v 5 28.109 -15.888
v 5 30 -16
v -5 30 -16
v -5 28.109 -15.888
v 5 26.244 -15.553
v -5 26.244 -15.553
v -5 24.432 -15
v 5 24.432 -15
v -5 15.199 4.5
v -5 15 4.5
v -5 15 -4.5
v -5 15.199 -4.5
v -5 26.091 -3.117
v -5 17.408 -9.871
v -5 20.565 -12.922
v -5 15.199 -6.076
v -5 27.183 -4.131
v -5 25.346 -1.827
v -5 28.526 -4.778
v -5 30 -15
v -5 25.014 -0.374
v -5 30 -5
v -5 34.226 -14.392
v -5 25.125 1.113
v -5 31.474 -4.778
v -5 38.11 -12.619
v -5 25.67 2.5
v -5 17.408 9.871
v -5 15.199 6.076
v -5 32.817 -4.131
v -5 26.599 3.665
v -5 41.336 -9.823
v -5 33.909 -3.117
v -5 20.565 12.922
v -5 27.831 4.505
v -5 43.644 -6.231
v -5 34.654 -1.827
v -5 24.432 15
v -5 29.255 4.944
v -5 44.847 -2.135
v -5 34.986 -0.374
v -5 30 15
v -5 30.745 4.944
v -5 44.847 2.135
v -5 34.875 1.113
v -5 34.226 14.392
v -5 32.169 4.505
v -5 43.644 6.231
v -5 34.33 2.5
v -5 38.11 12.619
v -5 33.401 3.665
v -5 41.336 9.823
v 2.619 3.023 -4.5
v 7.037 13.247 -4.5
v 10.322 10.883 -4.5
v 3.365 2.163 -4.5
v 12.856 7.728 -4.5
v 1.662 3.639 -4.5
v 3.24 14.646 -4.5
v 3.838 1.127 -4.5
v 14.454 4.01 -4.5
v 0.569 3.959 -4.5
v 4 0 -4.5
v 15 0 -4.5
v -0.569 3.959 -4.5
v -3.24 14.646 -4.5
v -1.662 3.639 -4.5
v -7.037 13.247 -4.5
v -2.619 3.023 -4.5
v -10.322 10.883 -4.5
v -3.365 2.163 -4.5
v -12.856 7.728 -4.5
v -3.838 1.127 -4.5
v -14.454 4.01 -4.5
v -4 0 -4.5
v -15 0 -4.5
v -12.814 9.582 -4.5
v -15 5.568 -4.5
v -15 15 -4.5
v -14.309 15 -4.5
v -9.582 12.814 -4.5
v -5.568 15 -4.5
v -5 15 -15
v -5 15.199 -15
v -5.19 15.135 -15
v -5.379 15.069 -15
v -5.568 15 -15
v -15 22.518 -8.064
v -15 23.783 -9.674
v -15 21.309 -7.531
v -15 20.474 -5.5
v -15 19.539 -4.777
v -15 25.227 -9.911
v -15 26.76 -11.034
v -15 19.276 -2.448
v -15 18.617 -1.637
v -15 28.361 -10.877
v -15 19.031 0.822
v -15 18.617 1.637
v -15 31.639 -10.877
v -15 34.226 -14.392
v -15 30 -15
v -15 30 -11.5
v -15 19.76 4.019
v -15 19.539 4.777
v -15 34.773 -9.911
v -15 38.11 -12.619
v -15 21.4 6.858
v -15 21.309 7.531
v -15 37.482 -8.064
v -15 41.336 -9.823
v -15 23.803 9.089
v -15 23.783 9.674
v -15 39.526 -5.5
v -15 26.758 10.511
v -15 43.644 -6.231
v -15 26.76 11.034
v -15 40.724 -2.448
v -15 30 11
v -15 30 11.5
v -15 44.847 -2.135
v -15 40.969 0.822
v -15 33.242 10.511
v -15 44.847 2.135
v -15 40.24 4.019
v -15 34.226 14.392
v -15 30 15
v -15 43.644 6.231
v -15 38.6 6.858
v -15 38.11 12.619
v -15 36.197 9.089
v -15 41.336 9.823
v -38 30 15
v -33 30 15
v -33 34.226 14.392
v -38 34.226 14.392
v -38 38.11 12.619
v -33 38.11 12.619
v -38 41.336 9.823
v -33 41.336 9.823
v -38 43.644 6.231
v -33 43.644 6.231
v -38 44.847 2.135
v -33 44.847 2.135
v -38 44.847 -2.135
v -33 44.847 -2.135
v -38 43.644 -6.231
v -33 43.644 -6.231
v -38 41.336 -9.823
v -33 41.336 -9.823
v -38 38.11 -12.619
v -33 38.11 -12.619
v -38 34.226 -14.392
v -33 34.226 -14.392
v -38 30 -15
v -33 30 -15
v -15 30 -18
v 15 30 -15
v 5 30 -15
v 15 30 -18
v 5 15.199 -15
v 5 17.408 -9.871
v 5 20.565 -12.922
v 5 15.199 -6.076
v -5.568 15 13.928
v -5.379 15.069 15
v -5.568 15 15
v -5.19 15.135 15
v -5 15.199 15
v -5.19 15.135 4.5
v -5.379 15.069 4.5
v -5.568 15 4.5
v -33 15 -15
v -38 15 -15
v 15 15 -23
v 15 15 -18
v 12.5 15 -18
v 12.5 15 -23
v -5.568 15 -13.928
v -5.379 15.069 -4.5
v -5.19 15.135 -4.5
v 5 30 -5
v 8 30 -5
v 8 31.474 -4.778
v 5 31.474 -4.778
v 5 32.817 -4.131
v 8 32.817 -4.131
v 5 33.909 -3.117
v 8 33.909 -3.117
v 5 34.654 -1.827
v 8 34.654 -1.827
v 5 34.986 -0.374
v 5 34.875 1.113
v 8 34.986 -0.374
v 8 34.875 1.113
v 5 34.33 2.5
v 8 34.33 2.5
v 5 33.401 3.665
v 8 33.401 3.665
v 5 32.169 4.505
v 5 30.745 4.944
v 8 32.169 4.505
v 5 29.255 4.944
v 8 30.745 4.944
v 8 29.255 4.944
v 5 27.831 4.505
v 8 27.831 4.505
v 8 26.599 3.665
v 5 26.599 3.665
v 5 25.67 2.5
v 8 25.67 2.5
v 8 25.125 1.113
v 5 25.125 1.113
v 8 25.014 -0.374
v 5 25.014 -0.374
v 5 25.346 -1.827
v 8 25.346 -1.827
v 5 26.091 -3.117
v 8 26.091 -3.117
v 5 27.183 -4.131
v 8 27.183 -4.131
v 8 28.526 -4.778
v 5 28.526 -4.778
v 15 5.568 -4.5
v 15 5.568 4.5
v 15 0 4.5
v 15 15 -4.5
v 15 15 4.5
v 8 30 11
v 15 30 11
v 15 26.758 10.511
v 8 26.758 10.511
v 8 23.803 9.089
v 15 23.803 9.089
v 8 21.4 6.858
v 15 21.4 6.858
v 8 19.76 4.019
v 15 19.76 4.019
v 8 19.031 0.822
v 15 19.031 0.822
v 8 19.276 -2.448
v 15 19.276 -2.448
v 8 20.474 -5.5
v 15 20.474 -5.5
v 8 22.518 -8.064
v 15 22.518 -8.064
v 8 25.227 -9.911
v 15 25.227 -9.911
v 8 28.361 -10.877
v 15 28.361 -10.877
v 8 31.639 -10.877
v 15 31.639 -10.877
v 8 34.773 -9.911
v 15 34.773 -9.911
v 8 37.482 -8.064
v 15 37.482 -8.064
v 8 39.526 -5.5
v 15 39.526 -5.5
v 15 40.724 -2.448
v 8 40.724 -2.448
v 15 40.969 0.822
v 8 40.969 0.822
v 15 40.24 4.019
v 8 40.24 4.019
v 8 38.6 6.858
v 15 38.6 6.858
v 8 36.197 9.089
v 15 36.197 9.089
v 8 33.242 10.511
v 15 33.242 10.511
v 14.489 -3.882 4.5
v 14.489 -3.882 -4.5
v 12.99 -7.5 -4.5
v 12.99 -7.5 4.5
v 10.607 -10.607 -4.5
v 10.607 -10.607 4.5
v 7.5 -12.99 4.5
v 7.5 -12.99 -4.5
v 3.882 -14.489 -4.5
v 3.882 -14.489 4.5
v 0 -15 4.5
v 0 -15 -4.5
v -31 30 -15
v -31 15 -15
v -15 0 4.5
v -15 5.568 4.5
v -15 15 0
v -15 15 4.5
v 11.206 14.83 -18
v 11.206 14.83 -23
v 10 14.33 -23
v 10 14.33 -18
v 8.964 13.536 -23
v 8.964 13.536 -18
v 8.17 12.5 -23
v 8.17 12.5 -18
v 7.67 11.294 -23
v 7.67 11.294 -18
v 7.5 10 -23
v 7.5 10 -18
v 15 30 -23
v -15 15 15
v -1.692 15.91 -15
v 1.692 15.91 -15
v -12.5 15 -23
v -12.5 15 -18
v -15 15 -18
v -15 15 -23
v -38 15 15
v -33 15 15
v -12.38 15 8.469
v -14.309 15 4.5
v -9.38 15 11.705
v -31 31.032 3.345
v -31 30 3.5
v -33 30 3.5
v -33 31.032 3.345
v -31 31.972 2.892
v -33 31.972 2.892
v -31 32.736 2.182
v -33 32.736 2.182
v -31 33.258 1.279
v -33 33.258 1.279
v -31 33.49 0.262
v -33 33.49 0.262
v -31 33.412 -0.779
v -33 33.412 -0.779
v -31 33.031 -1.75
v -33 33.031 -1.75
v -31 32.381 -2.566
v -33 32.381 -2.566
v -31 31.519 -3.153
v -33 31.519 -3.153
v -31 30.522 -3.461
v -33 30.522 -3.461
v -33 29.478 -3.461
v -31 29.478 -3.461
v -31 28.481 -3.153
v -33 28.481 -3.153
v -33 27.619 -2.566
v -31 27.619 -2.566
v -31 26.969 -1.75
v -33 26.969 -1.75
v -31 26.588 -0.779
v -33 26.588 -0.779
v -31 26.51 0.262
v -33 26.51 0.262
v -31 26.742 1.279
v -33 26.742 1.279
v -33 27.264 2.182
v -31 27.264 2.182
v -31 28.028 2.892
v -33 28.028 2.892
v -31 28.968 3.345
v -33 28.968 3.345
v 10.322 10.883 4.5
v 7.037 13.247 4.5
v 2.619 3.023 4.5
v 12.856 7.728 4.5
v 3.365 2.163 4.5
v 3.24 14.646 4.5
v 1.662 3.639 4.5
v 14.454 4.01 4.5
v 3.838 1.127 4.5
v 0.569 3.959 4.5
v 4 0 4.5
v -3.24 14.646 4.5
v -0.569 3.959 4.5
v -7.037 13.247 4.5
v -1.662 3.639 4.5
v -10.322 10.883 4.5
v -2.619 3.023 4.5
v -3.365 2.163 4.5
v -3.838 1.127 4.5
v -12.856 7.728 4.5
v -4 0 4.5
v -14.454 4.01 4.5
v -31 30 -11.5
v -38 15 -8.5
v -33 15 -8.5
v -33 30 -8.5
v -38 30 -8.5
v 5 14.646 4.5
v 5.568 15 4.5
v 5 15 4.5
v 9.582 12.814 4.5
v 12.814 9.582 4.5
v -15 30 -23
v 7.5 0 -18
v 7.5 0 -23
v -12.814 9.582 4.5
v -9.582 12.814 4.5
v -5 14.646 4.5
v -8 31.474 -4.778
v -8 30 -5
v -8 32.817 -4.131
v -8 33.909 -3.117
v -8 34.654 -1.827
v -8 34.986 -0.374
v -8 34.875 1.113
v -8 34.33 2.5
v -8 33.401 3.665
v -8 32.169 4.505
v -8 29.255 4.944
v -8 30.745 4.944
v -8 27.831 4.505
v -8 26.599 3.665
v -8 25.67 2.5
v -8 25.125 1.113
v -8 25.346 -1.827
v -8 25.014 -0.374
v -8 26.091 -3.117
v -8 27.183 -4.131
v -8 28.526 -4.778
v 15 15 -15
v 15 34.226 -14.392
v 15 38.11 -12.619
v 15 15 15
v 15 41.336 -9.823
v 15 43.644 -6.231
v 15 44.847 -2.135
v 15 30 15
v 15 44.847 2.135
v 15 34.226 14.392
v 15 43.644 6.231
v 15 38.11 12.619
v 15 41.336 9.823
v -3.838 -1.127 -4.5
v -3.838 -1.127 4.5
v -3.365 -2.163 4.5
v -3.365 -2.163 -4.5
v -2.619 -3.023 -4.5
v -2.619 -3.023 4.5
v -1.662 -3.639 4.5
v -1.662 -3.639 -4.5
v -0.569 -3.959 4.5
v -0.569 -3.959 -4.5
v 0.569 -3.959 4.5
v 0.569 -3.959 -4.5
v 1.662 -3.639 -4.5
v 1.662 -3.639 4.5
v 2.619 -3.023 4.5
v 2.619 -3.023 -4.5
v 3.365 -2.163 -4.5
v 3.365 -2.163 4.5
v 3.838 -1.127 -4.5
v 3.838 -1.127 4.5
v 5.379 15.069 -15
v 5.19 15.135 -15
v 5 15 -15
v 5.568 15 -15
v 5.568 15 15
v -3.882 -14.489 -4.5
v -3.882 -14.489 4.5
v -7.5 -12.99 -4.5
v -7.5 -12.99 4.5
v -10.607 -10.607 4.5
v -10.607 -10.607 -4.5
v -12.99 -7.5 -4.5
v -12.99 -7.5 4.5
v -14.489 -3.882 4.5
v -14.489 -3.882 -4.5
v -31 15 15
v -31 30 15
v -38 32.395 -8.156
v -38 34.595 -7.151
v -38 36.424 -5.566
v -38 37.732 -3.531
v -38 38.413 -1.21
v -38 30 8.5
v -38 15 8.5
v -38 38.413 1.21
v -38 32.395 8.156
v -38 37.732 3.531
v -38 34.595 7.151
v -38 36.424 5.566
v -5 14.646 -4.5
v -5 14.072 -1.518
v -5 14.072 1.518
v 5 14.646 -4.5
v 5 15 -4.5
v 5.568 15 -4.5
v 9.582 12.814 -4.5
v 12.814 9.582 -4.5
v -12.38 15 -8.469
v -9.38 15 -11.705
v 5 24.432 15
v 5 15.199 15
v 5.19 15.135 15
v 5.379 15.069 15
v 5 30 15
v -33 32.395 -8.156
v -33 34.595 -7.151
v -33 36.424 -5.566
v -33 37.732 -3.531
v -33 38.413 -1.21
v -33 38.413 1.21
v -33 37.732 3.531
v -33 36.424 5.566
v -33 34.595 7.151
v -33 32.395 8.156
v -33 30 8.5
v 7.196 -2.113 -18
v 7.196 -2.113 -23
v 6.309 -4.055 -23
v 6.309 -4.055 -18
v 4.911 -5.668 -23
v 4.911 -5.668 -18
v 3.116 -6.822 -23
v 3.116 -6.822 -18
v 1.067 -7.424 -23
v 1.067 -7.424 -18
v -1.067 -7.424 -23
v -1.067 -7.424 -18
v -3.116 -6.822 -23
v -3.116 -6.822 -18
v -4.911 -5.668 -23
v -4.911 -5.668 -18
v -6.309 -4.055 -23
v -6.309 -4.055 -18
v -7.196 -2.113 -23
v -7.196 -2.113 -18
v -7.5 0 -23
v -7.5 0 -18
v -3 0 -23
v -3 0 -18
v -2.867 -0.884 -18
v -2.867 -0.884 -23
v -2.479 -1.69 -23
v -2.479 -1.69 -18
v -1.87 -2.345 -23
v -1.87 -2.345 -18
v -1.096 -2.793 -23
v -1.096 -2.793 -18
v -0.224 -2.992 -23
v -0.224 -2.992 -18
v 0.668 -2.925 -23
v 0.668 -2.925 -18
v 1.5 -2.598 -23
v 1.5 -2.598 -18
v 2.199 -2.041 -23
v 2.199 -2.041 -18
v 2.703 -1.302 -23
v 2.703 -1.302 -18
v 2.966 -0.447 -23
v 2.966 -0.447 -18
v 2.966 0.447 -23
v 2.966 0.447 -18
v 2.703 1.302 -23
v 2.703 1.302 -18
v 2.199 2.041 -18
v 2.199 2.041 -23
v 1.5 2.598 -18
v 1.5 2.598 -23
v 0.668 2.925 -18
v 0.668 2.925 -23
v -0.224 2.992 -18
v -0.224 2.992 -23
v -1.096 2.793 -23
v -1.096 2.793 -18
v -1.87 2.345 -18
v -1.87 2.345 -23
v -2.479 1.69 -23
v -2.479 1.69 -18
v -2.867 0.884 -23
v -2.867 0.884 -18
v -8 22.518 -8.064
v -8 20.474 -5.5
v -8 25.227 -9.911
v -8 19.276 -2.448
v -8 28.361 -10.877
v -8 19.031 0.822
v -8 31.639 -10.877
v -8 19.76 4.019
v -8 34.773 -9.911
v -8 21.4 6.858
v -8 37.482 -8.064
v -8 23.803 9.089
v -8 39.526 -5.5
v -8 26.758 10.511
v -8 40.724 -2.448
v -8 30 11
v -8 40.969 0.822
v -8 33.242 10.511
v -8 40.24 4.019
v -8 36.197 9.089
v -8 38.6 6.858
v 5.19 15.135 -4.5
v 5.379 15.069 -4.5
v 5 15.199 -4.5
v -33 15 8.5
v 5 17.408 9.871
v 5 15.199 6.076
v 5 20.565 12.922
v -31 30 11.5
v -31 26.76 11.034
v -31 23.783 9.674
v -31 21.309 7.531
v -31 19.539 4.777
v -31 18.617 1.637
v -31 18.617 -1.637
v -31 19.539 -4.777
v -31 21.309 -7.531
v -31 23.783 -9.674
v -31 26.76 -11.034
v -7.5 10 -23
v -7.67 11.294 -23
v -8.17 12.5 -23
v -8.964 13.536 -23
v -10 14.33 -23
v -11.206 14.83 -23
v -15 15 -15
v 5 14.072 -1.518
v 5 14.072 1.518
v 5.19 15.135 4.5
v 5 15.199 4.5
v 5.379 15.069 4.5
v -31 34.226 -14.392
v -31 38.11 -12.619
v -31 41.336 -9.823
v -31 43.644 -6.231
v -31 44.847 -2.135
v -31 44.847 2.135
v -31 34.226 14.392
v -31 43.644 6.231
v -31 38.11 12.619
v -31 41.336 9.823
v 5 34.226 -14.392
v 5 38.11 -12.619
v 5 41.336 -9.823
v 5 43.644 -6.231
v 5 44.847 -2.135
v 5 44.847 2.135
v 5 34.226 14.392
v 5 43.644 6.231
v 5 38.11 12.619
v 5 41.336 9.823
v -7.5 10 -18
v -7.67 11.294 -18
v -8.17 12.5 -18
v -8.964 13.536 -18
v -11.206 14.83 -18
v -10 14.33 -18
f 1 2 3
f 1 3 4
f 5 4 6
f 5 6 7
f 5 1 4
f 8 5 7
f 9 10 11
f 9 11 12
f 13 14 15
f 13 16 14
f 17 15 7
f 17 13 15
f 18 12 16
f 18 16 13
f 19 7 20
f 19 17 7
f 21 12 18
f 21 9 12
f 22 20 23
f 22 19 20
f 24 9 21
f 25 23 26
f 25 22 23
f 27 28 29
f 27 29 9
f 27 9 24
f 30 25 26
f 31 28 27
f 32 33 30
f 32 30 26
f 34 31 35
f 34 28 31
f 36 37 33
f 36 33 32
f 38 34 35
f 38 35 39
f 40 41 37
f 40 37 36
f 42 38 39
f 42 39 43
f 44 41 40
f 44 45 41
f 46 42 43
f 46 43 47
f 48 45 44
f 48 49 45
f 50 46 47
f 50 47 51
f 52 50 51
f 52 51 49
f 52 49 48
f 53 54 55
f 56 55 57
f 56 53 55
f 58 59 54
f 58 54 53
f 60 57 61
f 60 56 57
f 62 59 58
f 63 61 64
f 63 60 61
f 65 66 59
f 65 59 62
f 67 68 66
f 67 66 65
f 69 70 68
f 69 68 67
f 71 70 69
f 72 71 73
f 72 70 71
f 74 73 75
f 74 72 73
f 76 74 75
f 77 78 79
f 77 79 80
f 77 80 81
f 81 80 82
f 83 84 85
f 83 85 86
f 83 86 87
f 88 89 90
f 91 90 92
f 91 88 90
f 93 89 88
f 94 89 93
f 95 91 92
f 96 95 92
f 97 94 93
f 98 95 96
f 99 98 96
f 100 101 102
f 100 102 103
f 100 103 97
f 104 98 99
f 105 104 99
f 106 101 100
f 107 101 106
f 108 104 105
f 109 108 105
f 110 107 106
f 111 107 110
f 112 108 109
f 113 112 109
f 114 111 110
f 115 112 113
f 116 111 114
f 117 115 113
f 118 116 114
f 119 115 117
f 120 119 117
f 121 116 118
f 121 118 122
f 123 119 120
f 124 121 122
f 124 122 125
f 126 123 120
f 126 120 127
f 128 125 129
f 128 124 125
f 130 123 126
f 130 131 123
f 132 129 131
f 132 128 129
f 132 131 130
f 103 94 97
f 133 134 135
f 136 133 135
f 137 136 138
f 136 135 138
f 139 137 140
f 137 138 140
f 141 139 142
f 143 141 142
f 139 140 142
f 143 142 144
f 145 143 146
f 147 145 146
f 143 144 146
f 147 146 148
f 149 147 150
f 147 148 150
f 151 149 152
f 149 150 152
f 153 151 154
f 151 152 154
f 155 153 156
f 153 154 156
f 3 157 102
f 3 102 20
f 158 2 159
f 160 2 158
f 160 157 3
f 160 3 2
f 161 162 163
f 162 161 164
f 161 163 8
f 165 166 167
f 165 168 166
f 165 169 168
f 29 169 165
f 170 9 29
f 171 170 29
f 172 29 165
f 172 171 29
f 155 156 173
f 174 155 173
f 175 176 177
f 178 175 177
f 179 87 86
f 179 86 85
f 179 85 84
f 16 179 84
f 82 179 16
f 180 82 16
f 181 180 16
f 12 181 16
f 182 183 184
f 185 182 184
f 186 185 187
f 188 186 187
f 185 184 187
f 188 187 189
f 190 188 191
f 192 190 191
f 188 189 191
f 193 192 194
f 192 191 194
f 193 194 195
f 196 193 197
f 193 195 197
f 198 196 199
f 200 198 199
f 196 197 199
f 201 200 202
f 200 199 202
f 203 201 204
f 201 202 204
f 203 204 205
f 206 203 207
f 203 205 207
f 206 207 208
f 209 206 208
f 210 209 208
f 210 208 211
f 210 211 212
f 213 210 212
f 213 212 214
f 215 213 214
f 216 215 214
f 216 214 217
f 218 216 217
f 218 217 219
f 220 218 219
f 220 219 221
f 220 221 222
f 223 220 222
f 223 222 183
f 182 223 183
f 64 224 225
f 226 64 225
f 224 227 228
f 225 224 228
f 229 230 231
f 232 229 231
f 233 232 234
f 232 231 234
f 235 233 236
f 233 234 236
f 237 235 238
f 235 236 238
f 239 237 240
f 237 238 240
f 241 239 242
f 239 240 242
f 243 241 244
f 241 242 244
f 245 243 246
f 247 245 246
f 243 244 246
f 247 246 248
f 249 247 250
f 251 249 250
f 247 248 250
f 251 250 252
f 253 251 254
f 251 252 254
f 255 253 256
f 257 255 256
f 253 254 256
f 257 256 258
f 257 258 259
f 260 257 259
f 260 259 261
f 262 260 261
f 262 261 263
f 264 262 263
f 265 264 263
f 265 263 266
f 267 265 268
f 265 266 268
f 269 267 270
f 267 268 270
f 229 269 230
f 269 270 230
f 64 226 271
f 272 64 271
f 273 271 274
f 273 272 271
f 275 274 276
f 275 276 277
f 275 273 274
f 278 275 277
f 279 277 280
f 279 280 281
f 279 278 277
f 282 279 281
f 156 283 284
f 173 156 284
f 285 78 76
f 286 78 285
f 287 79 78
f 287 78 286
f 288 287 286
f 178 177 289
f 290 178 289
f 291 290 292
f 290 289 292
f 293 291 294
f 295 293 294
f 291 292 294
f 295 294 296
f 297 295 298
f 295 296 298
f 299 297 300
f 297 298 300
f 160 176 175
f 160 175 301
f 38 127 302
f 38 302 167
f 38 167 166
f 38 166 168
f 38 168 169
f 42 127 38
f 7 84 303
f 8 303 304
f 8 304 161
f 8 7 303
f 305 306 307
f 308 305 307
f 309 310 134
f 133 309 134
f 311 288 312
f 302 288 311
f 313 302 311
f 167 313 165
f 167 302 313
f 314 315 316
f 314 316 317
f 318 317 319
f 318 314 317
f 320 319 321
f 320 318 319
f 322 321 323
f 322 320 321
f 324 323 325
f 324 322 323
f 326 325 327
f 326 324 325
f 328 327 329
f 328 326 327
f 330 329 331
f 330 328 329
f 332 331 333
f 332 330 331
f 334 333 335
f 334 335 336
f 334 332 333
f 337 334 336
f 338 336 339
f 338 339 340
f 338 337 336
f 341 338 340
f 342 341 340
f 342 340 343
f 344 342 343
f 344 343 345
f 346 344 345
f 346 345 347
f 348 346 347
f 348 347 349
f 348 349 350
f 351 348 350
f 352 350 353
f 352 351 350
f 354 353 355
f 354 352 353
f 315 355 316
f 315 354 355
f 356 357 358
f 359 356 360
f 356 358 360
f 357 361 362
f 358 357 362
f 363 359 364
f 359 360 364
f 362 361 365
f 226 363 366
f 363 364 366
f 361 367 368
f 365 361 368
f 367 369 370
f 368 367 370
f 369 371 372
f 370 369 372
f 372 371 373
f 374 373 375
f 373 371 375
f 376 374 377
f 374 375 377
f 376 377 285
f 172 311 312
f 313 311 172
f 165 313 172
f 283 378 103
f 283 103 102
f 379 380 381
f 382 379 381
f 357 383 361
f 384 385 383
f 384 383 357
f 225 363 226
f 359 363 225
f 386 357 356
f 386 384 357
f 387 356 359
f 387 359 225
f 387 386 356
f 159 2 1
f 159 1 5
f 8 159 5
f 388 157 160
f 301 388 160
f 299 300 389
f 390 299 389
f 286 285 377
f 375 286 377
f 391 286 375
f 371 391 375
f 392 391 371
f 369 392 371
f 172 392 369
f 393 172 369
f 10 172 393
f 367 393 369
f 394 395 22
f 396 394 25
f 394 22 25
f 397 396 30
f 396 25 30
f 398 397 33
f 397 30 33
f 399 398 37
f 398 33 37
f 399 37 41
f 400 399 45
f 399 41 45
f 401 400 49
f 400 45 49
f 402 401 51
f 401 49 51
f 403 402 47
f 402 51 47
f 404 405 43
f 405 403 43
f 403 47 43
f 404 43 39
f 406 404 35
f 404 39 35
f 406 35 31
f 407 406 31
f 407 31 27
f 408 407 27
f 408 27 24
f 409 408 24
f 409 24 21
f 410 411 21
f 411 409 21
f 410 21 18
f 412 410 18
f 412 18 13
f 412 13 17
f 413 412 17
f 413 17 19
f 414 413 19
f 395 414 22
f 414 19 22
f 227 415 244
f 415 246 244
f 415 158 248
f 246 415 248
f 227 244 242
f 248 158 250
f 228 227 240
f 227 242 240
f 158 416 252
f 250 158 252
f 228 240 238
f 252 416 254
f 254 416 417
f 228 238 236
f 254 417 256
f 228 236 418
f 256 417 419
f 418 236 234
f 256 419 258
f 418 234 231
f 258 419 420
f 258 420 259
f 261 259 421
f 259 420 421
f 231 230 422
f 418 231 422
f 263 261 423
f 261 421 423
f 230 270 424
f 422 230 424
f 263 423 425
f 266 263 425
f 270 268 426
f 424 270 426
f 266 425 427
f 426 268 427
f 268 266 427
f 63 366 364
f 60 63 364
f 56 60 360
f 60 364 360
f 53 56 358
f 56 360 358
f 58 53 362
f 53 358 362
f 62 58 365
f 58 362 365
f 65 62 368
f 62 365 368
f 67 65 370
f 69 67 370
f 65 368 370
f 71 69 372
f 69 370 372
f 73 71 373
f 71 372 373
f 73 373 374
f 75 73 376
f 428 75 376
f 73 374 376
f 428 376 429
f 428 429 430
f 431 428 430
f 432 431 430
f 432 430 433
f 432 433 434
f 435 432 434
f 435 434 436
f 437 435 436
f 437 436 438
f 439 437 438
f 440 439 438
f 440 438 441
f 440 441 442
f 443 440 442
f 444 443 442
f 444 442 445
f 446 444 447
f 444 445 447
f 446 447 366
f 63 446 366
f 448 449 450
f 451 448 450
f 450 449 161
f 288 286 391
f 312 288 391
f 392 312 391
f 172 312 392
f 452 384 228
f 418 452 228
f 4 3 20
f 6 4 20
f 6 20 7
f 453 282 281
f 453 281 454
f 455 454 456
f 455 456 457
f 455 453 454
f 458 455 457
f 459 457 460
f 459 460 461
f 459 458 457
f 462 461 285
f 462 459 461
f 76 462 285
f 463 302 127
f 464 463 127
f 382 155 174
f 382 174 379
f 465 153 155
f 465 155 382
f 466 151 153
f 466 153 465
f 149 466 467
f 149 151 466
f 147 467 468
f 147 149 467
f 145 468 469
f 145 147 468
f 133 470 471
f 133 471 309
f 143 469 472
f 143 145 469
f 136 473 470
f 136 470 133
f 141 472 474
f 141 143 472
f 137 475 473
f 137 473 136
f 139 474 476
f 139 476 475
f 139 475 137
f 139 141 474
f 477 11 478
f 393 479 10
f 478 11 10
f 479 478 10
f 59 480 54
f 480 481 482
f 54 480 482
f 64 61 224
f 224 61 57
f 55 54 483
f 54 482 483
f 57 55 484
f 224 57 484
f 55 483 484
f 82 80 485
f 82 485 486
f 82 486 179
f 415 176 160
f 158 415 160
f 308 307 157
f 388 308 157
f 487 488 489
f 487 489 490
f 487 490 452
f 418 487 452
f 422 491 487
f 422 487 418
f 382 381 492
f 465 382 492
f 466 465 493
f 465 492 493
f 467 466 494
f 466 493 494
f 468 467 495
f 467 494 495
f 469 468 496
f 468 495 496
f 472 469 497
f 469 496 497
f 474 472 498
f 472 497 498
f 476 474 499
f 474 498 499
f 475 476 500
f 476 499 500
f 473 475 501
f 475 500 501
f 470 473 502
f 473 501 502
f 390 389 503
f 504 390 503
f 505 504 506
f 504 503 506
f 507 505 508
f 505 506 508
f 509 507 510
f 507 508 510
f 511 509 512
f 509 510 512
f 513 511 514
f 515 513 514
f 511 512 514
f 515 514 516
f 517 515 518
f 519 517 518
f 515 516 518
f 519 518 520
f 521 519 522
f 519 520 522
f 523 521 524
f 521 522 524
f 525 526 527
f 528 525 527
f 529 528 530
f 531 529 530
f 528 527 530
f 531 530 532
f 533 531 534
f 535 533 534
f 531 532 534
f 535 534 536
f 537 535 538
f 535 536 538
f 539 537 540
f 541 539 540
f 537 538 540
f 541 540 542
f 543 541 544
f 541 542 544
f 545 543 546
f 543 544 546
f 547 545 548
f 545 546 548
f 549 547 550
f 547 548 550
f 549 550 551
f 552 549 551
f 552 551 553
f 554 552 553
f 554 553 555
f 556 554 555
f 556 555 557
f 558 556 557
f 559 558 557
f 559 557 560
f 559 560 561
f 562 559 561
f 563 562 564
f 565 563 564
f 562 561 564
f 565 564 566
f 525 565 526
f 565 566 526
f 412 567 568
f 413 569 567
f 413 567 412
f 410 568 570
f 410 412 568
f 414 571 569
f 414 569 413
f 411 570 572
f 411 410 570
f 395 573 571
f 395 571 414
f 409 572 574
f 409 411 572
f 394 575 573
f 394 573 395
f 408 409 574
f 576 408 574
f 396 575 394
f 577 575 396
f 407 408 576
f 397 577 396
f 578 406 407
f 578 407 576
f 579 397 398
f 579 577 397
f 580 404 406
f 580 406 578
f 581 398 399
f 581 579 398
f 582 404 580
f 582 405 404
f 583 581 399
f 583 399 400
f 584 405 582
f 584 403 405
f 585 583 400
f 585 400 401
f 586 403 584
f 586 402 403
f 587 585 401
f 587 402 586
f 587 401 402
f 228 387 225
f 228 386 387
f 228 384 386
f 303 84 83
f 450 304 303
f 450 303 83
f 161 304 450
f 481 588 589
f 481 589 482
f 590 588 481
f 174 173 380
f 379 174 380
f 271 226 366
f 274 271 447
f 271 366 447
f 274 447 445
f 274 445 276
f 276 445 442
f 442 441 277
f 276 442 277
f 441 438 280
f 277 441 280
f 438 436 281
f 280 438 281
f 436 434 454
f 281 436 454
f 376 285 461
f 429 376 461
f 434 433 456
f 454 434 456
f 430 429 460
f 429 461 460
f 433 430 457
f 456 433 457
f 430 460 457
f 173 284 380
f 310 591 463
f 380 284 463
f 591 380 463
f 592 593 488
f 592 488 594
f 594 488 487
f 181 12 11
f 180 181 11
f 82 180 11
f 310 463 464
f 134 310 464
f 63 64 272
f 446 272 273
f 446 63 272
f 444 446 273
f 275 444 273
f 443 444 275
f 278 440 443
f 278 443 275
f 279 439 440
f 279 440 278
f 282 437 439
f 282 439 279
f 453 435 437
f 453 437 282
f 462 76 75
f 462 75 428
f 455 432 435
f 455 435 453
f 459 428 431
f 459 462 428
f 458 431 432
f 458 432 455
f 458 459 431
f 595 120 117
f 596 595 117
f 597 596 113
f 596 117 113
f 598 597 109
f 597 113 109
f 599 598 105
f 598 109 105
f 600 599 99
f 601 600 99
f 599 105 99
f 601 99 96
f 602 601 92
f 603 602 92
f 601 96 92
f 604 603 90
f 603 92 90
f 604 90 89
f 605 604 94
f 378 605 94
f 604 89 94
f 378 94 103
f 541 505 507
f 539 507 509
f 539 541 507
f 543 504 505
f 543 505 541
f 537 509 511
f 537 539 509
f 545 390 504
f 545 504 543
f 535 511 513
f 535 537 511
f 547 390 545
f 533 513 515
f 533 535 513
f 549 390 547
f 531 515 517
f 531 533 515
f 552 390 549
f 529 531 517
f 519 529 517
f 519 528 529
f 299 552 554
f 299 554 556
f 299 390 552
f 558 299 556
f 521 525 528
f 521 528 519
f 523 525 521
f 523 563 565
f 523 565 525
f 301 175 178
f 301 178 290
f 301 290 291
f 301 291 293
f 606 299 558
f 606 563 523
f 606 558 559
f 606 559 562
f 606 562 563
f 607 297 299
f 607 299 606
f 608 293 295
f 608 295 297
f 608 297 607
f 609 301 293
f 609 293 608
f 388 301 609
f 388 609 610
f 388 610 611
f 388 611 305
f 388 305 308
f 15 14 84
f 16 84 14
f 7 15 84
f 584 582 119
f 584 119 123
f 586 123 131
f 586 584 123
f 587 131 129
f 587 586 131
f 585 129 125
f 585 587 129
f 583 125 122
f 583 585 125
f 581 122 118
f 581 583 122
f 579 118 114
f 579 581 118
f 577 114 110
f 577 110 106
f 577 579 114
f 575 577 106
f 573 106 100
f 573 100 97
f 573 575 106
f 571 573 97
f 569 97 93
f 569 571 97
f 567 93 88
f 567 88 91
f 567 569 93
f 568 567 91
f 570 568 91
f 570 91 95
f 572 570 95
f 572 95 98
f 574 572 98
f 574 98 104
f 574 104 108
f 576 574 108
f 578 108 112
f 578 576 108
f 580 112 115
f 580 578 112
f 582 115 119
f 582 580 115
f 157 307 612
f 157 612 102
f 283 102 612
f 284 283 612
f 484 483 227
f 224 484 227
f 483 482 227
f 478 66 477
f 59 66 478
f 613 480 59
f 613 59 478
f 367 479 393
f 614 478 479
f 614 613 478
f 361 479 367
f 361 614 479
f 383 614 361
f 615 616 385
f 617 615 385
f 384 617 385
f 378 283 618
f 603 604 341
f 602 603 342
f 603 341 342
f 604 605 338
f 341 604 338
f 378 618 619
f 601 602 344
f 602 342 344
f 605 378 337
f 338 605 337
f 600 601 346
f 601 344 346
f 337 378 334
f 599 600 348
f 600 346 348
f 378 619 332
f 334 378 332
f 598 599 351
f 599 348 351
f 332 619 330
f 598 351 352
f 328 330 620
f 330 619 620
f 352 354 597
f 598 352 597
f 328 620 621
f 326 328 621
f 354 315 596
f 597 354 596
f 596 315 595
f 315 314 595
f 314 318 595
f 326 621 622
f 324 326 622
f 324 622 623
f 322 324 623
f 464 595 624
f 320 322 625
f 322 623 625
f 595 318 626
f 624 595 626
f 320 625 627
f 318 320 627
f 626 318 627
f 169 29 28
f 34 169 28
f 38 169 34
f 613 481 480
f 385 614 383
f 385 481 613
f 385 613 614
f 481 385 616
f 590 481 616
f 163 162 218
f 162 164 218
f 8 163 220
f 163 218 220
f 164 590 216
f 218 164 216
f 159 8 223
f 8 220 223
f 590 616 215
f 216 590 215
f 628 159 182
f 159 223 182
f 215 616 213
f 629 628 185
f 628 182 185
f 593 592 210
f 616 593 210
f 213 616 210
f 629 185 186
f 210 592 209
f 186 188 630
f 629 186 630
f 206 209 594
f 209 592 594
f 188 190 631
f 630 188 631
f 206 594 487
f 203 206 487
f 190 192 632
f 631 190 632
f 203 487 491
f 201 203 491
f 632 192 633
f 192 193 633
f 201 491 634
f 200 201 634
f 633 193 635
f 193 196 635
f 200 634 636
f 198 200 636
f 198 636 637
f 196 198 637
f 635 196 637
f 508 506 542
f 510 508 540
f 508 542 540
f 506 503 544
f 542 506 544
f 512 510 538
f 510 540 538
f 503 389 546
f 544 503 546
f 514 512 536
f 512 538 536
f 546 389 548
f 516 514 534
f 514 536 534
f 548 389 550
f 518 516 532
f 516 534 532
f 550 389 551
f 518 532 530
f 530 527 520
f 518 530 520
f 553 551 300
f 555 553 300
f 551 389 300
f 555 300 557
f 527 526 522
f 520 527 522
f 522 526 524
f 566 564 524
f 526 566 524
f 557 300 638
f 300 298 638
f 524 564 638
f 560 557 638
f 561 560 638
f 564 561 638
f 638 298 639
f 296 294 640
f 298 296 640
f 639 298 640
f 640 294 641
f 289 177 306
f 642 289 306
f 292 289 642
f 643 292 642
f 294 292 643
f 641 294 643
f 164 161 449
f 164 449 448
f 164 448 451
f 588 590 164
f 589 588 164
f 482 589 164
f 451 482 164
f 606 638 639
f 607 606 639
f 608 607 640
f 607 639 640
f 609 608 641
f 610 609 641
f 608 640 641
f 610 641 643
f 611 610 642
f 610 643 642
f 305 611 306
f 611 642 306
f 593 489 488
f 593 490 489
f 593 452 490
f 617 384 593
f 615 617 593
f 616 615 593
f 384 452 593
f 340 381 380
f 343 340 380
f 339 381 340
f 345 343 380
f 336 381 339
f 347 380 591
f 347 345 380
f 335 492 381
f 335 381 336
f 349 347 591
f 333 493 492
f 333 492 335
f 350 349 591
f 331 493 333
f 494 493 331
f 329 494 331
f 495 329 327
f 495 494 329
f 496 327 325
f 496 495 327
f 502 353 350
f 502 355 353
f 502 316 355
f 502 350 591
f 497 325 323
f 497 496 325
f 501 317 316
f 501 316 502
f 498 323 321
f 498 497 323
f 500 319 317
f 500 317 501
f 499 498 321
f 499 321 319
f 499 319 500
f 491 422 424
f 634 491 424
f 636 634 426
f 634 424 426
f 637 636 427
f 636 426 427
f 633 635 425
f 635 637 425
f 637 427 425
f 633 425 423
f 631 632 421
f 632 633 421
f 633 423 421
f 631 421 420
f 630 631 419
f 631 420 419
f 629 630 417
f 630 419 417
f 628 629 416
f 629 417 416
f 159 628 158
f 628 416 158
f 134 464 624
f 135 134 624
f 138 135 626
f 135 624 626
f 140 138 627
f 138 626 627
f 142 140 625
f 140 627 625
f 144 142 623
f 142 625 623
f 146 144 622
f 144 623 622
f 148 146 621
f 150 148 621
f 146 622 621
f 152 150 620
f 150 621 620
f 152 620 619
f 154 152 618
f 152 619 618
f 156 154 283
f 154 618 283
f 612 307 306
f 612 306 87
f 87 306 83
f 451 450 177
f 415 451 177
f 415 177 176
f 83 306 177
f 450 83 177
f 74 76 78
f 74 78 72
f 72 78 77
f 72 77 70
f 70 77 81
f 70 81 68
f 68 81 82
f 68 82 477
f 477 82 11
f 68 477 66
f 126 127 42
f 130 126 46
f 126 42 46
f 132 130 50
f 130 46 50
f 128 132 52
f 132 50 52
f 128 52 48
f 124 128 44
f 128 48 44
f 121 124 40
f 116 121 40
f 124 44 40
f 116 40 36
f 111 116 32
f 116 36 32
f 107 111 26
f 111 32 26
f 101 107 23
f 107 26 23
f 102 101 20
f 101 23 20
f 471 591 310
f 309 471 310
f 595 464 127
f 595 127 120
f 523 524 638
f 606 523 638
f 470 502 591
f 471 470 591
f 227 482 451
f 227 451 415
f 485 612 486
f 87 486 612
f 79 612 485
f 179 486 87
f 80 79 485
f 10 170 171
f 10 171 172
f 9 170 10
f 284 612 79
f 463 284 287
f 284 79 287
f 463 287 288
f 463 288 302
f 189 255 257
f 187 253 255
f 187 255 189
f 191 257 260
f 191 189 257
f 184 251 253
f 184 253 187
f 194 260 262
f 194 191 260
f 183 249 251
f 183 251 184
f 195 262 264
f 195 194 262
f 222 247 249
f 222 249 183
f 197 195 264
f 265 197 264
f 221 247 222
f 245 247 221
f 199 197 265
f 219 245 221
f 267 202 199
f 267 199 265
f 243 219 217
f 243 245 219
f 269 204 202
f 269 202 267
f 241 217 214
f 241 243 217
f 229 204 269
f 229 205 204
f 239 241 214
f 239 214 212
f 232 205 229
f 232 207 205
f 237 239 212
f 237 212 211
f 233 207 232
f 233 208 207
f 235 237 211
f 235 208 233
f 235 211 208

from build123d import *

# Parameters (mm, degrees)
SKETCH1_R           = 15
BOSS_EXTRUDE1_DEPTH = 30
SKETCH8_W           = 30
SKETCH8_H           = 15
REVOLVE1_ANGLE      = 180
SKETCH9_W           = 30
SKETCH9_H           = 30
BOSS_EXTRUDE3_DEPTH = 15
SKETCH10_R          = 5
CUT_EXTRUDE1_DEPTH  = 30
SKETCH13_R          = 16
CUT_EXTRUDE2_DEPTH  = 10
SKETCH14_W          = 10
SKETCH14_H          = 15
CUT_EXTRUDE3_DEPTH  = 67
CUT_EXTRUDE4_START  = -7
SKETCH15_R          = 11
SKETCH15_R_2        = 5
CUT_EXTRUDE4_DEPTH  = 7
SKETCH16_R          = 11
SKETCH16_R_2        = 5
CUT_EXTRUDE5_DEPTH  = 7
SKETCH17_R          = 15
SKETCH17_R_2        = 8
SKETCH17_R_3        = 3.5
BOSS_EXTRUDE4_DEPTH = 2
BOSS_EXTRUDE5_DEPTH = 5
BOSS_EXTRUDE6_DEPTH = 16
SKETCH21_W          = 53
SKETCH21_H          = 30
CUT_EXTRUDE7_DEPTH  = 20
SKETCH23_W          = 15
SKETCH23_H          = 9
SKETCH24_W          = 30
SKETCH24_H          = 9
BOSS_EXTRUDE7_DEPTH = 15
SKETCH25_R          = 4
CUT_EXTRUDE8_DEPTH  = 15
BOSS_EXTRUDE8_START = 3
SKETCH26_W          = 10
SKETCH26_H          = 15
BOSS_EXTRUDE8_DEPTH = 5
SKETCH30_W          = 30
SKETCH30_H          = 15
BOSS_EXTRUDE9_DEPTH = 3
SKETCH27_R          = 16
CUT_EXTRUDE9_DEPTH  = 16
SKETCH28_R          = 16
CUT_EXTRUDE10_DEPTH = 10.5
SKETCH29_R          = 16
CUT_EXTRUDE12_DEPTH = 10


with BuildPart() as part:
    # Sketch1 → Boss-Extrude1 (new body)
    with BuildSketch(Plane(origin=(0, 0, 0), x_dir=(1, 0, 0), z_dir=(0, 1, 0))):
        with Locations(Location((0, 0, 0), (0, 0, 270))):
            Circle(SKETCH1_R)
    extrude(amount=BOSS_EXTRUDE1_DEPTH)

    # Sketch8 → Revolve1 (revolve)
    with BuildSketch(Plane(origin=(0, 30, 0), x_dir=(1, 0, 0), z_dir=(0, 1, 0))):
        with Locations((0, -7.5)):
            Rectangle(SKETCH8_W, SKETCH8_H)
    revolve(axis=Axis((15, 30, 0), (-1, 0, 0)), revolution_arc=REVOLVE1_ANGLE)

    # Sketch9 → Boss-Extrude3 (add)
    with BuildSketch(Plane.XZ.offset(-30)):
        Rectangle(SKETCH9_W, SKETCH9_H)
    extrude(amount=BOSS_EXTRUDE3_DEPTH)

    # Sketch10 → Cut-Extrude1 (cut)
    with BuildSketch(Plane(origin=(15, 0, 0), x_dir=(0, 0, -1), z_dir=(1, 0, 0))):
        with Locations((0, 30)):
            Circle(SKETCH10_R)
    extrude(amount=-CUT_EXTRUDE1_DEPTH, mode=Mode.SUBTRACT)

    # Sketch13 → Cut-Extrude2 (cut)
    with BuildSketch(Plane(origin=(5, 0, 0), x_dir=(0, 0, -1), z_dir=(1, 0, 0))):
        with Locations((0, 30)):
            Circle(SKETCH13_R)
    extrude(amount=-CUT_EXTRUDE2_DEPTH, mode=Mode.SUBTRACT)

    # Sketch14 → Cut-Extrude3 (cut)
    with BuildSketch(Plane.XY.offset(15)):
        with Locations((0, 22.5)):
            Rectangle(SKETCH14_W, SKETCH14_H)
    extrude(amount=-CUT_EXTRUDE3_DEPTH, mode=Mode.SUBTRACT)

    # Sketch15 → Cut-Extrude4 (cut)
    with BuildSketch(Plane.ZY.offset(15).offset(CUT_EXTRUDE4_START)):
        with Locations((0, 30)):
            Circle(SKETCH15_R)
        with Locations(Location((0, 30, 0), (0, 0, 180))):
            Circle(SKETCH15_R_2, mode=Mode.SUBTRACT)
    extrude(amount=CUT_EXTRUDE4_DEPTH, mode=Mode.SUBTRACT)

    # Sketch16 → Cut-Extrude5 (cut)
    with BuildSketch(Plane(origin=(15, 0, 0), x_dir=(0, 0, -1), z_dir=(1, 0, 0))):
        with Locations(Location((0, 30, 0), (0, 0, 180))):
            Circle(SKETCH16_R)
        with Locations((0, 30)):
            Circle(SKETCH16_R_2, mode=Mode.SUBTRACT)
    extrude(amount=-CUT_EXTRUDE5_DEPTH, mode=Mode.SUBTRACT)



with BuildPart() as body_2:
    # Sketch17 → Boss-Extrude4 (new body)
    # profile 1 of 4: a face of its own
    with BuildSketch(Plane.ZY.offset(31)):
        with Locations((0, 30)):
            Circle(SKETCH17_R)
        with Locations((0, 30)):
            Circle(SKETCH17_R_2, mode=Mode.SUBTRACT)
    # profile 2 of 4: a face of its own
    with BuildSketch(Plane.ZY.offset(31)):
        with Locations((0, 30)):
            Circle(SKETCH17_R_2)
        with Locations((0, 30)):
            Circle(SKETCH17_R_3, mode=Mode.SUBTRACT)
    # profile 3 of 4: a face of its own
    with BuildSketch(Plane.ZY.offset(31)):
        with BuildLine():
            ThreePointArc((0, 15), (-10.606601718, 19.393398282), (-15, 30))
            Line((-15, 30), (-15, 15))
            Line((-15, 15), (0, 15))
        make_face()
    # profile 4 of 4: a face of its own
    with BuildSketch(Plane.ZY.offset(31)):
        with BuildLine():
            Line((15, 15), (15, 30))
            ThreePointArc((15, 30), (10.606601718, 19.393398282), (0, 15))
            Line((0, 15), (15, 15))
        make_face()
    extrude(amount=BOSS_EXTRUDE4_DEPTH)

    # Sketch18 → Boss-Extrude5 (add)
    with BuildSketch(Plane.ZY.offset(33)):
        with BuildLine():
            ThreePointArc((-8.5, 30), (0, 38.5), (8.5, 30))
            Line((8.5, 30), (8.5, 15))
            Line((8.5, 15), (15, 15))
            Line((15, 15), (15, 30))
            ThreePointArc((15, 30), (0, 45), (-15, 30))
            Line((-15, 30), (-15, 15))
            Line((-15, 15), (-8.5, 15))
            Line((-8.5, 15), (-8.5, 30))
        make_face()
    extrude(amount=BOSS_EXTRUDE5_DEPTH)


with BuildPart() as part_1:
    add(part.part)

    add(body_2.part)  # Boss-Extrude6 merges body 2
    # Sketch20 → Boss-Extrude6 (add)
    with BuildSketch(Plane.ZY.offset(15)):
        with BuildLine():
            ThreePointArc((11.5, 30), (0, 18.5), (-11.5, 30))
            Line((-11.5, 30), (-15, 30))
            Line((-15, 30), (-15, 15))
            Line((-15, 15), (0, 15))
            Line((0, 15), (15, 15))
            Line((15, 15), (15, 30))
            Line((15, 30), (11.5, 30))
        make_face()
    extrude(amount=BOSS_EXTRUDE6_DEPTH)

    # Sketch21 → Cut-Extrude7 (cut)
    with BuildSketch(Plane.XZ.offset(-15)):
        with Locations((-11.5, 0)):
            Rectangle(SKETCH21_W, SKETCH21_H)
    extrude(amount=CUT_EXTRUDE7_DEPTH, mode=Mode.SUBTRACT)


with BuildPart() as cut_extrude7_piece_1:
    # of the separate pieces the step leaves, piece 1, a body of its own (cut_extrude7_pieces)
    add(part_1.part.solids().sort_by_distance((-31, 30, 15))[0])



with BuildPart() as cut_extrude7_piece_2:
    # of the separate pieces the step leaves, piece 2, a body of its own (cut_extrude7_pieces)
    add(part_1.part.solids().sort_by_distance((5, 15, -15))[0])


with BuildPart() as body_3:
    # Sketch23 → Revolve2 (revolve)
    with BuildSketch(Plane(origin=(0, 0, 0), x_dir=(-1, 0, 0), z_dir=(0, -1, 0)), mode=Mode.PRIVATE) as revolve2_sk:
        with Locations((-7.5, 0)):
            Rectangle(SKETCH23_W, SKETCH23_H)
    revolve(revolve2_sk.sketch.rotate(Axis((0, 0, 4.5), (0, 0, -1)), 90), axis=Axis((0, 0, 4.5), (0, 0, -1)))


with BuildPart() as cut_extrude7_piece_1_1:
    add(cut_extrude7_piece_1.part)

    add(cut_extrude7_piece_2.part)  # Boss-Extrude7 merges Cut-Extrude7 piece 2

    add(body_3.part)  # Boss-Extrude7 merges body 3
    # Sketch24 → Boss-Extrude7 (add)
    with BuildSketch(Plane.XZ.offset(-15)):
        Rectangle(SKETCH24_W, SKETCH24_H)
    extrude(amount=BOSS_EXTRUDE7_DEPTH)

    # Sketch25 → Cut-Extrude8 (cut)
    with BuildSketch(Plane.XY.offset(4.5)):
        Circle(SKETCH25_R)
    extrude(amount=-CUT_EXTRUDE8_DEPTH, mode=Mode.SUBTRACT)



with BuildPart() as body_2_2:
    # Sketch26 → Boss-Extrude8 (new body)
    with BuildSketch(Plane(origin=(0, 0, -15), x_dir=(-1, 0, 0), z_dir=(0, 0, -1)).offset(BOSS_EXTRUDE8_START)):
        with Locations((-10, 22.5)):
            Rectangle(SKETCH26_W, SKETCH26_H)
        with BuildLine():
            Line((15, 30), (-5, 30))
            Line((-5, 30), (-5, 15))
            Line((-5, 15), (-12.5, 15))
            ThreePointArc((-12.5, 15), (-8.964466094, 13.535533906), (-7.5, 10))
            Line((-7.5, 10), (-7.5, 0))
            ThreePointArc((-7.5, 0), (0, 7.5), (7.5, 0))
            Line((7.5, 0), (7.5, 10))
            ThreePointArc((7.5, 10), (8.964466094, 13.535533906), (12.5, 15))
            Line((12.5, 15), (15, 15))
            Line((15, 15), (15, 30))
        make_face()
        with BuildLine():
            ThreePointArc((7.5, 0), (0, 7.5), (-7.5, 0))
            Line((-7.5, 0), (-3, 0))
            ThreePointArc((-3, 0), (0, 3), (3, 0))
            Line((3, 0), (7.5, 0))
        make_face()
        with BuildLine():
            Line((-3, 0), (-7.5, 0))
            ThreePointArc((-7.5, 0), (0, -7.5), (7.5, 0))
            Line((7.5, 0), (3, 0))
            ThreePointArc((3, 0), (0, -3), (-3, 0))
        make_face()
    extrude(amount=BOSS_EXTRUDE8_DEPTH)


with BuildPart() as cut_extrude7_piece_1_2:
    add(cut_extrude7_piece_1_1.part)

    add(body_2_2.part)  # Boss-Extrude9 merges body 2 2
    # Sketch30 → Boss-Extrude9 (add)
    with BuildSketch(Plane.XY.offset(-18)):
        with Locations((0, 22.5)):
            Rectangle(SKETCH30_W, SKETCH30_H)
    extrude(amount=BOSS_EXTRUDE9_DEPTH)

    # Sketch27 → Cut-Extrude9 (cut)
    with BuildSketch(Plane.XY.offset(4.5)):
        Circle(SKETCH27_R)
    extrude(amount=CUT_EXTRUDE9_DEPTH, mode=Mode.SUBTRACT)

    # Sketch28 → Cut-Extrude10 (cut)
    with BuildSketch(Plane(origin=(0, 0, -4.5), x_dir=(-1, 0, 0), z_dir=(0, 0, -1))):
        Circle(SKETCH28_R)
    extrude(amount=CUT_EXTRUDE10_DEPTH, mode=Mode.SUBTRACT)

    # Sketch29 → Cut-Extrude12 (cut)
    with BuildSketch(Plane.ZY.offset(-5)):
        with Locations((0, 30)):
            Circle(SKETCH29_R)
    extrude(amount=CUT_EXTRUDE12_DEPTH, mode=Mode.SUBTRACT)


solid = cut_extrude7_piece_1_2.part
